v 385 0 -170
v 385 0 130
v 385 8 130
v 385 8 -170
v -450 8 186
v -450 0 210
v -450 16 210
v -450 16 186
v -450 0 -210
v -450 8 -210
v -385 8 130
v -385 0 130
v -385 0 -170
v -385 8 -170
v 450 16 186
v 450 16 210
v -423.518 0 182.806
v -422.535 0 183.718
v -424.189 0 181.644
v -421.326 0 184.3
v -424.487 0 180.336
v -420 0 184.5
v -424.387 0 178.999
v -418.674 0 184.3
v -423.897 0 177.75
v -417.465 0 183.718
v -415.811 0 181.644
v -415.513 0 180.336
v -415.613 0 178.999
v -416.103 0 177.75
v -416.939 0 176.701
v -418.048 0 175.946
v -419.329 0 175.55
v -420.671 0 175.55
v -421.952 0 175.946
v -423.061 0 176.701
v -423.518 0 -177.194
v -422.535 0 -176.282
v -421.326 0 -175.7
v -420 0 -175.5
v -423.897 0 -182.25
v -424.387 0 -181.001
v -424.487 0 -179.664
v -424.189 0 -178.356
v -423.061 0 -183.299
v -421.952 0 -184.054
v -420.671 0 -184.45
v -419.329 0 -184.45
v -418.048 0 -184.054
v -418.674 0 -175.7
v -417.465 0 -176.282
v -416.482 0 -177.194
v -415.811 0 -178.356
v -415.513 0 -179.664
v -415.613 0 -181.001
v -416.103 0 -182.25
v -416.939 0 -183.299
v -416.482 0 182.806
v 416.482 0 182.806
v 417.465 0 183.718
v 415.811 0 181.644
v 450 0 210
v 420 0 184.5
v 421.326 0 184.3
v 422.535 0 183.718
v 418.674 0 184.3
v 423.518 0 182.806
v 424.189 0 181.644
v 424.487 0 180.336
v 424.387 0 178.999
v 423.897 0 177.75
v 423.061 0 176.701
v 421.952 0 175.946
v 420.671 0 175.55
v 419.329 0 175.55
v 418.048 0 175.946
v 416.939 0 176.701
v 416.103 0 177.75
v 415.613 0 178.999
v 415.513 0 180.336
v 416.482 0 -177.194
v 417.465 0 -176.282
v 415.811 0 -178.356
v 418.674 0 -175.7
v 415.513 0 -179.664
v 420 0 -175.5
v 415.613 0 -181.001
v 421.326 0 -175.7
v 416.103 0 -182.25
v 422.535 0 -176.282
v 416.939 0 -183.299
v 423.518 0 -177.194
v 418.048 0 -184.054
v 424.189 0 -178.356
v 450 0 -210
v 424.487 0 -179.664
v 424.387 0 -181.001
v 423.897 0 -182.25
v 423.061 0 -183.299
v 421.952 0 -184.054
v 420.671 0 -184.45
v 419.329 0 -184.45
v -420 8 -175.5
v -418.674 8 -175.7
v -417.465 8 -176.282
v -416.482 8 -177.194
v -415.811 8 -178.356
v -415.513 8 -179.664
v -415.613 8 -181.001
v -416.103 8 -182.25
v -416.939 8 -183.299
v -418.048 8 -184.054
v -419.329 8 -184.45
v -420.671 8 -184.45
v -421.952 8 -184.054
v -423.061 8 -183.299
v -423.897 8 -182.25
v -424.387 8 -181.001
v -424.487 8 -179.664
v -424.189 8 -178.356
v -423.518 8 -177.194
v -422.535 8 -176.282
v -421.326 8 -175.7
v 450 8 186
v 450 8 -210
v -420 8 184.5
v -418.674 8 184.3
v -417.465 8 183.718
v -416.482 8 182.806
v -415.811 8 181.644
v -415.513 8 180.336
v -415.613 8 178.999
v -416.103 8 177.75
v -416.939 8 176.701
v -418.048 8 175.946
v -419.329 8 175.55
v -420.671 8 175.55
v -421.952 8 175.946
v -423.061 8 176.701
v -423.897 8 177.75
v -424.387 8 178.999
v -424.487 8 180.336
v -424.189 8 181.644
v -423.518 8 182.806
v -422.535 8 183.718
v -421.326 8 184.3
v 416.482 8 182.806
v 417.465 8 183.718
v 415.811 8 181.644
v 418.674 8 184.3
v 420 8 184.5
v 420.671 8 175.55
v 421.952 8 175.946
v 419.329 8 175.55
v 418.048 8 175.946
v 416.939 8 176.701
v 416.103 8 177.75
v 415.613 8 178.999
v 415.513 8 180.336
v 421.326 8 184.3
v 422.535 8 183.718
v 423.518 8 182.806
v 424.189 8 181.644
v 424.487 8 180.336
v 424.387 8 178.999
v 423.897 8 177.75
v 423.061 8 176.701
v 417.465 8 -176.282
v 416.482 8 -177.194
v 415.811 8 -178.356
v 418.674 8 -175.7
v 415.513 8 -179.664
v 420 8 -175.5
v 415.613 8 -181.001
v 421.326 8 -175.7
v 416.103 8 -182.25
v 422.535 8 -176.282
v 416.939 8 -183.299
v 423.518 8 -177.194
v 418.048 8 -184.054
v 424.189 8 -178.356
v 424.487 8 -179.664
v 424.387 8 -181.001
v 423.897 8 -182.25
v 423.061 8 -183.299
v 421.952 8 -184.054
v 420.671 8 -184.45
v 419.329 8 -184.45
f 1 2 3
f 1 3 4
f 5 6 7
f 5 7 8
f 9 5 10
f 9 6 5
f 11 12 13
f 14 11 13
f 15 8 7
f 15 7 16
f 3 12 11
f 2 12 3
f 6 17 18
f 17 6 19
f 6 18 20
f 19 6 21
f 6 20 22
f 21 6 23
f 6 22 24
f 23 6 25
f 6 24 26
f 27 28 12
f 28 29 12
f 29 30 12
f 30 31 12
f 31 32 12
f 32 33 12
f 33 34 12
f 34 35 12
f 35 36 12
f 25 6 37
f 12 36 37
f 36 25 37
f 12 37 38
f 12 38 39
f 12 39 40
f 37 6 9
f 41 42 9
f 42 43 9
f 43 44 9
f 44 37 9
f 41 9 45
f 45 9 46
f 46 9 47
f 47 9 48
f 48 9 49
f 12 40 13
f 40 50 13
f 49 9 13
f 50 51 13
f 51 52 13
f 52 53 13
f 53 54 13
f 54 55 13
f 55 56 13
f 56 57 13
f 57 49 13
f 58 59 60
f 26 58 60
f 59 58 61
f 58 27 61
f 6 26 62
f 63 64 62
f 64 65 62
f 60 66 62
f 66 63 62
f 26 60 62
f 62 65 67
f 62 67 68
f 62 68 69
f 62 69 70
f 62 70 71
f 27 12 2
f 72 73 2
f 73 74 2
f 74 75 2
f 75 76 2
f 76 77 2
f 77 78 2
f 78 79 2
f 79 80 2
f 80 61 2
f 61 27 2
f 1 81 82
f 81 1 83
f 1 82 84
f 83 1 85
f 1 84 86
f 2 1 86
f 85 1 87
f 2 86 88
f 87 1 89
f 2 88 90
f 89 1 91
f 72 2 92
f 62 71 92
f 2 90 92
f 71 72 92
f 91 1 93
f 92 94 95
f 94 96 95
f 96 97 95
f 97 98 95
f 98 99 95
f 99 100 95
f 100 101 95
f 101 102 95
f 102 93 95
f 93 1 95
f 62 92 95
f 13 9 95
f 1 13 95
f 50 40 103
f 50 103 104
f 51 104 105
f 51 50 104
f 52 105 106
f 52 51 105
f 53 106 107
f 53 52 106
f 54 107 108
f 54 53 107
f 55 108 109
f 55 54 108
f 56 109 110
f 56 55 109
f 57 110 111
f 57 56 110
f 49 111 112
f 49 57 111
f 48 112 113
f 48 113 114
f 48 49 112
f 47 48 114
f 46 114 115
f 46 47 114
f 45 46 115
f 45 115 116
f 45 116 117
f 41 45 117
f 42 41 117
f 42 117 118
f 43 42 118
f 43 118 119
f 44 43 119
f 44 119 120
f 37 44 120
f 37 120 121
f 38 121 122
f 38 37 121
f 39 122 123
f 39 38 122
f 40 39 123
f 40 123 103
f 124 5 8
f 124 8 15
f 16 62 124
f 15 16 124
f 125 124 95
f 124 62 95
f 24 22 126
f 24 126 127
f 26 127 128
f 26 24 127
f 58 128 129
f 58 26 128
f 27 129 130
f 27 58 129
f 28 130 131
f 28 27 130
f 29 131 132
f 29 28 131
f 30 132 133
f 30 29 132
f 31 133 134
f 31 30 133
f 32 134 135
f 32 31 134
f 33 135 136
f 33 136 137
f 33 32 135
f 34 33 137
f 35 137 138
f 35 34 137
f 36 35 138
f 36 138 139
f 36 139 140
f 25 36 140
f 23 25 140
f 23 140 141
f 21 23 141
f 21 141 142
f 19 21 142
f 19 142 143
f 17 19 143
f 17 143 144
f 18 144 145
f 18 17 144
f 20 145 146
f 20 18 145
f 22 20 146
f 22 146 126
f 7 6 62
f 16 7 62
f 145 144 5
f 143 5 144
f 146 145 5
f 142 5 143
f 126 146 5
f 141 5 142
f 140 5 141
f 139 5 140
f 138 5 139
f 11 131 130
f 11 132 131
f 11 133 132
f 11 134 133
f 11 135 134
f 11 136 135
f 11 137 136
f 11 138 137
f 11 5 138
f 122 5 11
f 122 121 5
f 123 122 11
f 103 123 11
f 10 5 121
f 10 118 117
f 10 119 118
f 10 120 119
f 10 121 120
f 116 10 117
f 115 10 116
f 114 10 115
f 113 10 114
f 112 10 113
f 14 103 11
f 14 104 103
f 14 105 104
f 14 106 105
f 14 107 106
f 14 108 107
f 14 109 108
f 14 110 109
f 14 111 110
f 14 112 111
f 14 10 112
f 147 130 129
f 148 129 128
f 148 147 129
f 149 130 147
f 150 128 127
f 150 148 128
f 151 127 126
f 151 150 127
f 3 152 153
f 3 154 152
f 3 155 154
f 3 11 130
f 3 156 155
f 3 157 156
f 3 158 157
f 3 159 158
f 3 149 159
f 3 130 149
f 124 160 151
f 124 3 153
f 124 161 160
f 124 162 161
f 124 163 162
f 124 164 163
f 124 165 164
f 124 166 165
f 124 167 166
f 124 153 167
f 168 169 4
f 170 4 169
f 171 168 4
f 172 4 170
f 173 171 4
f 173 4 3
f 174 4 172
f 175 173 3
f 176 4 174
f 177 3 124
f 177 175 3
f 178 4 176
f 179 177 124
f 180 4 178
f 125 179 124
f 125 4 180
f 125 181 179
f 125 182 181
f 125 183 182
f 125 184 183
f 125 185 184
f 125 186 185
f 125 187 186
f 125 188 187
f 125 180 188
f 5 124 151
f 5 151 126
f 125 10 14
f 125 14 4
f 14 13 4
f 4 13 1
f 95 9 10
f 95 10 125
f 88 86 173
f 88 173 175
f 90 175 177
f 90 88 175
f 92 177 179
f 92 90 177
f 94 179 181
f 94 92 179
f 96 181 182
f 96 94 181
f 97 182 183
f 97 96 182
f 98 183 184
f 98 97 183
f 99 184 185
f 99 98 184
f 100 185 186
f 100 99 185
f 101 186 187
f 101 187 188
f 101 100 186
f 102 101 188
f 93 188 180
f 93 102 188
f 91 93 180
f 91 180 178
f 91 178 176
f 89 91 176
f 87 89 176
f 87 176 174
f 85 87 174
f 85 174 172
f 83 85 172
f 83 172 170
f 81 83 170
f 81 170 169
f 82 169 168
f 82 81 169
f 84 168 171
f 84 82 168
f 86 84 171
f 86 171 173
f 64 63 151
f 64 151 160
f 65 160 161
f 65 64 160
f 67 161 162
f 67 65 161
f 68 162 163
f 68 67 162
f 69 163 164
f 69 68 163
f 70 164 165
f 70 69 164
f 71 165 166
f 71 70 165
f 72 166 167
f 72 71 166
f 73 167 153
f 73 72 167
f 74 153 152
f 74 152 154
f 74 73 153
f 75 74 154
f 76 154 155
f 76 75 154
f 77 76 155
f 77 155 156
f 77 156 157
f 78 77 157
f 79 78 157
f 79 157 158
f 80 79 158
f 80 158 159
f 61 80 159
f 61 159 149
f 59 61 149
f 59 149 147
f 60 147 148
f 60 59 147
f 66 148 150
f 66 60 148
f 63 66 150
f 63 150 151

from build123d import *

# Parameters (mm, degrees)
F_01_GUARD_OUTLINE_W      = 900
F_01_GUARD_OUTLINE_H      = 420
F_01_GUARD_OUTLINE_R      = 4.5
F_01_GUARD_OUTLINE_W_2    = 770
F_01_GUARD_OUTLINE_H_2    = 300
F_01_GUARD_PANEL_DEPTH    = 8
F_02_FRAME_RAIL_PROFILE_W = 900
F_02_FRAME_RAIL_PROFILE_H = 24
F_02_FRAME_RAIL_DEPTH     = 16


with BuildPart() as part:
    # 01_Guard_Outline → 01_Guard_Panel (new body)
    with BuildSketch(Plane(origin=(0, 0, 0), x_dir=(1, 0, 0), z_dir=(0, 1, 0))):
        Rectangle(F_01_GUARD_OUTLINE_W, F_01_GUARD_OUTLINE_H)
        with Locations(Location((-420, -180, 0), (0, 0, 270))):
            Circle(F_01_GUARD_OUTLINE_R, mode=Mode.SUBTRACT)
        with Locations(Location((420, -180, 0), (0, 0, 270))):
            Circle(F_01_GUARD_OUTLINE_R, mode=Mode.SUBTRACT)
        with Locations(Location((-420, 180, 0), (0, 0, 270))):
            Circle(F_01_GUARD_OUTLINE_R, mode=Mode.SUBTRACT)
        with Locations(Location((420, 180, 0), (0, 0, 270))):
            Circle(F_01_GUARD_OUTLINE_R, mode=Mode.SUBTRACT)
        with Locations((0, 20)):
            Rectangle(F_01_GUARD_OUTLINE_W_2, F_01_GUARD_OUTLINE_H_2, mode=Mode.SUBTRACT)
    extrude(amount=F_01_GUARD_PANEL_DEPTH)

    # 02_Frame_Rail_Profile → 02_Frame_Rail (add)
    with BuildSketch(Plane(origin=(0, 0, 0), x_dir=(1, 0, 0), z_dir=(0, 1, 0))):
        with Locations((0, -198)):
            Rectangle(F_02_FRAME_RAIL_PROFILE_W, F_02_FRAME_RAIL_PROFILE_H)
    extrude(amount=F_02_FRAME_RAIL_DEPTH)


solid = part.part
